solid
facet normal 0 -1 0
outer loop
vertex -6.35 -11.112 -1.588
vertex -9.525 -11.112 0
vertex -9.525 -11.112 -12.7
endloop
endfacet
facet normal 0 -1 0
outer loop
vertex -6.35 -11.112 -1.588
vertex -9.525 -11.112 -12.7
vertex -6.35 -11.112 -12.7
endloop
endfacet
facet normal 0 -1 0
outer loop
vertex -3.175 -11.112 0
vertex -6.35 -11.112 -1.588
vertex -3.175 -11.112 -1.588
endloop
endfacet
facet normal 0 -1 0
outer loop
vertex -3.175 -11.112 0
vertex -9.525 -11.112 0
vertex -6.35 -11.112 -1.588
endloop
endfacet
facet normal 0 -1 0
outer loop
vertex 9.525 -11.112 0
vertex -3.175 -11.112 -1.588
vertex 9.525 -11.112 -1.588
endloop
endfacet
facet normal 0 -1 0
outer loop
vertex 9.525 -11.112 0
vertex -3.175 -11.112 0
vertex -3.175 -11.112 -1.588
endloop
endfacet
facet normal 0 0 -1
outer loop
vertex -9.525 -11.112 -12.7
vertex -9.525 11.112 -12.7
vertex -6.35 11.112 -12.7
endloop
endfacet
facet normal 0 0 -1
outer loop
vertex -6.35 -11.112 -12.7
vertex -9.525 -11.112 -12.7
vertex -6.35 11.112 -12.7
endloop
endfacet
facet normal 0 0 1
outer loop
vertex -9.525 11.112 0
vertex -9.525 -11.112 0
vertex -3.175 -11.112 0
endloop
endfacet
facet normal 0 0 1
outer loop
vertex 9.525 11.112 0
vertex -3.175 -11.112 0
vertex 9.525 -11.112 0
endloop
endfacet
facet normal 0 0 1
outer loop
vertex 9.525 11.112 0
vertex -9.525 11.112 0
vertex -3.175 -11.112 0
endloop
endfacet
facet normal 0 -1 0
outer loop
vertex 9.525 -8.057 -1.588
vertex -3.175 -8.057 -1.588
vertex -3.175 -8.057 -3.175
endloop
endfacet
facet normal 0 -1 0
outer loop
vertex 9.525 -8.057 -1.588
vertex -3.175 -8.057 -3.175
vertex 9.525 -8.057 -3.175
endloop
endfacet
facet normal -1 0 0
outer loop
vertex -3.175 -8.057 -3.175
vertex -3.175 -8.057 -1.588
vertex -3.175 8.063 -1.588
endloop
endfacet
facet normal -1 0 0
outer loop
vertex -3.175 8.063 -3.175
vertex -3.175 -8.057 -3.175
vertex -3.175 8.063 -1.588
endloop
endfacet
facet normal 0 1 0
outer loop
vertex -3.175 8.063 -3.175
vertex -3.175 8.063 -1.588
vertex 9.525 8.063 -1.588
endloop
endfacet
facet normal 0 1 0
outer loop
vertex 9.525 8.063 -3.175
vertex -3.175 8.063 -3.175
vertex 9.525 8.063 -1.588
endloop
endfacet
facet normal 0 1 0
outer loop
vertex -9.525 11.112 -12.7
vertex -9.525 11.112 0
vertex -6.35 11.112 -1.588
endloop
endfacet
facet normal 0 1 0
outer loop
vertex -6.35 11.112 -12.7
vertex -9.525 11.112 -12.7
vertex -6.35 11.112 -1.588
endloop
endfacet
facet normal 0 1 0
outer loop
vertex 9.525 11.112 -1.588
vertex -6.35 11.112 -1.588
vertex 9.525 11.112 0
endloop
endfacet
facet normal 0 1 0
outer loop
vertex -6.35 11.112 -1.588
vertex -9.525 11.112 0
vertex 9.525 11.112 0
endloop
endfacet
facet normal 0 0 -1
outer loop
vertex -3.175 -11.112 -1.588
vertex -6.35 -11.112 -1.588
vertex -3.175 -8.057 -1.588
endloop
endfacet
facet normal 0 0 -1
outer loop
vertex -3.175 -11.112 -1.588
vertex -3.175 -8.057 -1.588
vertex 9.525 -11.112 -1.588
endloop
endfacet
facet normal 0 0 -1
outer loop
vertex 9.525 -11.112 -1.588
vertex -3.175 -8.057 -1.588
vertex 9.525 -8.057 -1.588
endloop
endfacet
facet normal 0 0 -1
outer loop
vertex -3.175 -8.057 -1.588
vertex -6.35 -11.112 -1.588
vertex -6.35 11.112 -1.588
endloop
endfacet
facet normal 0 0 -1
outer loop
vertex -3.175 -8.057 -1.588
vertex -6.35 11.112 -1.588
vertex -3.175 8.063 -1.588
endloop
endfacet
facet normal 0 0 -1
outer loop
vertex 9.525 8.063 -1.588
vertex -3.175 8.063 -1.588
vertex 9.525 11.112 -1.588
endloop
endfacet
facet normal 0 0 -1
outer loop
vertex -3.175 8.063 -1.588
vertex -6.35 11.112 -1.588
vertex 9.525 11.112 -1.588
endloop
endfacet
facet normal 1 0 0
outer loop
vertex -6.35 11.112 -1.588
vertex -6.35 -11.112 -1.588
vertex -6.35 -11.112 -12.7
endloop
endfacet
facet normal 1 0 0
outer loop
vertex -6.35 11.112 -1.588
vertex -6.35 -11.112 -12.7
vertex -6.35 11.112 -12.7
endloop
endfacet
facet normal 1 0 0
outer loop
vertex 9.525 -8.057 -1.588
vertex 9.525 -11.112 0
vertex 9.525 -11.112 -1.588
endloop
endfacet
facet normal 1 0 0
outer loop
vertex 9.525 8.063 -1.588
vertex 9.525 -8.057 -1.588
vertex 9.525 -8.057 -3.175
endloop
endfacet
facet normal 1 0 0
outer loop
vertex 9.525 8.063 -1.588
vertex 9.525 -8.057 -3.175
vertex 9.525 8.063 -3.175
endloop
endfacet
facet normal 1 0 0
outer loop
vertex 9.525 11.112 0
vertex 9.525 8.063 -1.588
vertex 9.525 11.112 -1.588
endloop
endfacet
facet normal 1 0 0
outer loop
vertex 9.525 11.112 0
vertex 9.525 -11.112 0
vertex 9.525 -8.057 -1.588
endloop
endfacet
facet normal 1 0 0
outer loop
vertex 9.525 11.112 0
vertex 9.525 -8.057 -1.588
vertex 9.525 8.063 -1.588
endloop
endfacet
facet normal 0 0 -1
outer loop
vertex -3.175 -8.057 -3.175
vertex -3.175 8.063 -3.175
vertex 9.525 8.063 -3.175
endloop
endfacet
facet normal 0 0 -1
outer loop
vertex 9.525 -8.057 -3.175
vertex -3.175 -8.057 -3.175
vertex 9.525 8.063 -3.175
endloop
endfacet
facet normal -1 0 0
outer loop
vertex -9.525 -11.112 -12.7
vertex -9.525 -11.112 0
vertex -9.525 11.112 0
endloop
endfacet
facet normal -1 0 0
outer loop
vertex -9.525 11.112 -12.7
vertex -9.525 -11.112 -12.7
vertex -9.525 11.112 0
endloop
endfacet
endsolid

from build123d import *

# Parameters (mm, degrees)
F0_W     = 12.7
F0_H     = 3.0555259615
F0_H_2   = 3.0494434938
F1_DEPTH = 1.5875
F0_W_2   = 3.175
F0_H_3   = 22.225
F2_DEPTH = 12.7
F0_H_4   = 16.1200305447
F3_DEPTH = 3.175


with BuildPart() as f1:
    # F0 (on Top) → F1 (new body)
    with BuildSketch(Plane.XY):
        Polygon((-3.175, 8.0630565062), (-3.175, 11.1125), (-6.35, 11.1125), (-6.35, -11.1125), (-3.175, -11.1125), (-3.175, -8.0569740385), align=None)
        with Locations((3.175, -9.5847370192)):
            Rectangle(F0_W, F0_H)
        with Locations((3.175, 9.5877782531)):
            Rectangle(F0_W, F0_H_2)
    extrude(amount=-F1_DEPTH)

    # F0 (on Top) → F2 (join)
    with BuildSketch(Plane.XY):
        with Locations((-7.9375, 0)):
            Rectangle(F0_W_2, F0_H_3)
    extrude(amount=-F2_DEPTH)

    # F0 (on Top) → F3 (join)
    with BuildSketch(Plane.XY):
        with Locations((3.175, 0.0030412339)):
            Rectangle(F0_W, F0_H_4)
    extrude(amount=-F3_DEPTH)


solid = f1.part
